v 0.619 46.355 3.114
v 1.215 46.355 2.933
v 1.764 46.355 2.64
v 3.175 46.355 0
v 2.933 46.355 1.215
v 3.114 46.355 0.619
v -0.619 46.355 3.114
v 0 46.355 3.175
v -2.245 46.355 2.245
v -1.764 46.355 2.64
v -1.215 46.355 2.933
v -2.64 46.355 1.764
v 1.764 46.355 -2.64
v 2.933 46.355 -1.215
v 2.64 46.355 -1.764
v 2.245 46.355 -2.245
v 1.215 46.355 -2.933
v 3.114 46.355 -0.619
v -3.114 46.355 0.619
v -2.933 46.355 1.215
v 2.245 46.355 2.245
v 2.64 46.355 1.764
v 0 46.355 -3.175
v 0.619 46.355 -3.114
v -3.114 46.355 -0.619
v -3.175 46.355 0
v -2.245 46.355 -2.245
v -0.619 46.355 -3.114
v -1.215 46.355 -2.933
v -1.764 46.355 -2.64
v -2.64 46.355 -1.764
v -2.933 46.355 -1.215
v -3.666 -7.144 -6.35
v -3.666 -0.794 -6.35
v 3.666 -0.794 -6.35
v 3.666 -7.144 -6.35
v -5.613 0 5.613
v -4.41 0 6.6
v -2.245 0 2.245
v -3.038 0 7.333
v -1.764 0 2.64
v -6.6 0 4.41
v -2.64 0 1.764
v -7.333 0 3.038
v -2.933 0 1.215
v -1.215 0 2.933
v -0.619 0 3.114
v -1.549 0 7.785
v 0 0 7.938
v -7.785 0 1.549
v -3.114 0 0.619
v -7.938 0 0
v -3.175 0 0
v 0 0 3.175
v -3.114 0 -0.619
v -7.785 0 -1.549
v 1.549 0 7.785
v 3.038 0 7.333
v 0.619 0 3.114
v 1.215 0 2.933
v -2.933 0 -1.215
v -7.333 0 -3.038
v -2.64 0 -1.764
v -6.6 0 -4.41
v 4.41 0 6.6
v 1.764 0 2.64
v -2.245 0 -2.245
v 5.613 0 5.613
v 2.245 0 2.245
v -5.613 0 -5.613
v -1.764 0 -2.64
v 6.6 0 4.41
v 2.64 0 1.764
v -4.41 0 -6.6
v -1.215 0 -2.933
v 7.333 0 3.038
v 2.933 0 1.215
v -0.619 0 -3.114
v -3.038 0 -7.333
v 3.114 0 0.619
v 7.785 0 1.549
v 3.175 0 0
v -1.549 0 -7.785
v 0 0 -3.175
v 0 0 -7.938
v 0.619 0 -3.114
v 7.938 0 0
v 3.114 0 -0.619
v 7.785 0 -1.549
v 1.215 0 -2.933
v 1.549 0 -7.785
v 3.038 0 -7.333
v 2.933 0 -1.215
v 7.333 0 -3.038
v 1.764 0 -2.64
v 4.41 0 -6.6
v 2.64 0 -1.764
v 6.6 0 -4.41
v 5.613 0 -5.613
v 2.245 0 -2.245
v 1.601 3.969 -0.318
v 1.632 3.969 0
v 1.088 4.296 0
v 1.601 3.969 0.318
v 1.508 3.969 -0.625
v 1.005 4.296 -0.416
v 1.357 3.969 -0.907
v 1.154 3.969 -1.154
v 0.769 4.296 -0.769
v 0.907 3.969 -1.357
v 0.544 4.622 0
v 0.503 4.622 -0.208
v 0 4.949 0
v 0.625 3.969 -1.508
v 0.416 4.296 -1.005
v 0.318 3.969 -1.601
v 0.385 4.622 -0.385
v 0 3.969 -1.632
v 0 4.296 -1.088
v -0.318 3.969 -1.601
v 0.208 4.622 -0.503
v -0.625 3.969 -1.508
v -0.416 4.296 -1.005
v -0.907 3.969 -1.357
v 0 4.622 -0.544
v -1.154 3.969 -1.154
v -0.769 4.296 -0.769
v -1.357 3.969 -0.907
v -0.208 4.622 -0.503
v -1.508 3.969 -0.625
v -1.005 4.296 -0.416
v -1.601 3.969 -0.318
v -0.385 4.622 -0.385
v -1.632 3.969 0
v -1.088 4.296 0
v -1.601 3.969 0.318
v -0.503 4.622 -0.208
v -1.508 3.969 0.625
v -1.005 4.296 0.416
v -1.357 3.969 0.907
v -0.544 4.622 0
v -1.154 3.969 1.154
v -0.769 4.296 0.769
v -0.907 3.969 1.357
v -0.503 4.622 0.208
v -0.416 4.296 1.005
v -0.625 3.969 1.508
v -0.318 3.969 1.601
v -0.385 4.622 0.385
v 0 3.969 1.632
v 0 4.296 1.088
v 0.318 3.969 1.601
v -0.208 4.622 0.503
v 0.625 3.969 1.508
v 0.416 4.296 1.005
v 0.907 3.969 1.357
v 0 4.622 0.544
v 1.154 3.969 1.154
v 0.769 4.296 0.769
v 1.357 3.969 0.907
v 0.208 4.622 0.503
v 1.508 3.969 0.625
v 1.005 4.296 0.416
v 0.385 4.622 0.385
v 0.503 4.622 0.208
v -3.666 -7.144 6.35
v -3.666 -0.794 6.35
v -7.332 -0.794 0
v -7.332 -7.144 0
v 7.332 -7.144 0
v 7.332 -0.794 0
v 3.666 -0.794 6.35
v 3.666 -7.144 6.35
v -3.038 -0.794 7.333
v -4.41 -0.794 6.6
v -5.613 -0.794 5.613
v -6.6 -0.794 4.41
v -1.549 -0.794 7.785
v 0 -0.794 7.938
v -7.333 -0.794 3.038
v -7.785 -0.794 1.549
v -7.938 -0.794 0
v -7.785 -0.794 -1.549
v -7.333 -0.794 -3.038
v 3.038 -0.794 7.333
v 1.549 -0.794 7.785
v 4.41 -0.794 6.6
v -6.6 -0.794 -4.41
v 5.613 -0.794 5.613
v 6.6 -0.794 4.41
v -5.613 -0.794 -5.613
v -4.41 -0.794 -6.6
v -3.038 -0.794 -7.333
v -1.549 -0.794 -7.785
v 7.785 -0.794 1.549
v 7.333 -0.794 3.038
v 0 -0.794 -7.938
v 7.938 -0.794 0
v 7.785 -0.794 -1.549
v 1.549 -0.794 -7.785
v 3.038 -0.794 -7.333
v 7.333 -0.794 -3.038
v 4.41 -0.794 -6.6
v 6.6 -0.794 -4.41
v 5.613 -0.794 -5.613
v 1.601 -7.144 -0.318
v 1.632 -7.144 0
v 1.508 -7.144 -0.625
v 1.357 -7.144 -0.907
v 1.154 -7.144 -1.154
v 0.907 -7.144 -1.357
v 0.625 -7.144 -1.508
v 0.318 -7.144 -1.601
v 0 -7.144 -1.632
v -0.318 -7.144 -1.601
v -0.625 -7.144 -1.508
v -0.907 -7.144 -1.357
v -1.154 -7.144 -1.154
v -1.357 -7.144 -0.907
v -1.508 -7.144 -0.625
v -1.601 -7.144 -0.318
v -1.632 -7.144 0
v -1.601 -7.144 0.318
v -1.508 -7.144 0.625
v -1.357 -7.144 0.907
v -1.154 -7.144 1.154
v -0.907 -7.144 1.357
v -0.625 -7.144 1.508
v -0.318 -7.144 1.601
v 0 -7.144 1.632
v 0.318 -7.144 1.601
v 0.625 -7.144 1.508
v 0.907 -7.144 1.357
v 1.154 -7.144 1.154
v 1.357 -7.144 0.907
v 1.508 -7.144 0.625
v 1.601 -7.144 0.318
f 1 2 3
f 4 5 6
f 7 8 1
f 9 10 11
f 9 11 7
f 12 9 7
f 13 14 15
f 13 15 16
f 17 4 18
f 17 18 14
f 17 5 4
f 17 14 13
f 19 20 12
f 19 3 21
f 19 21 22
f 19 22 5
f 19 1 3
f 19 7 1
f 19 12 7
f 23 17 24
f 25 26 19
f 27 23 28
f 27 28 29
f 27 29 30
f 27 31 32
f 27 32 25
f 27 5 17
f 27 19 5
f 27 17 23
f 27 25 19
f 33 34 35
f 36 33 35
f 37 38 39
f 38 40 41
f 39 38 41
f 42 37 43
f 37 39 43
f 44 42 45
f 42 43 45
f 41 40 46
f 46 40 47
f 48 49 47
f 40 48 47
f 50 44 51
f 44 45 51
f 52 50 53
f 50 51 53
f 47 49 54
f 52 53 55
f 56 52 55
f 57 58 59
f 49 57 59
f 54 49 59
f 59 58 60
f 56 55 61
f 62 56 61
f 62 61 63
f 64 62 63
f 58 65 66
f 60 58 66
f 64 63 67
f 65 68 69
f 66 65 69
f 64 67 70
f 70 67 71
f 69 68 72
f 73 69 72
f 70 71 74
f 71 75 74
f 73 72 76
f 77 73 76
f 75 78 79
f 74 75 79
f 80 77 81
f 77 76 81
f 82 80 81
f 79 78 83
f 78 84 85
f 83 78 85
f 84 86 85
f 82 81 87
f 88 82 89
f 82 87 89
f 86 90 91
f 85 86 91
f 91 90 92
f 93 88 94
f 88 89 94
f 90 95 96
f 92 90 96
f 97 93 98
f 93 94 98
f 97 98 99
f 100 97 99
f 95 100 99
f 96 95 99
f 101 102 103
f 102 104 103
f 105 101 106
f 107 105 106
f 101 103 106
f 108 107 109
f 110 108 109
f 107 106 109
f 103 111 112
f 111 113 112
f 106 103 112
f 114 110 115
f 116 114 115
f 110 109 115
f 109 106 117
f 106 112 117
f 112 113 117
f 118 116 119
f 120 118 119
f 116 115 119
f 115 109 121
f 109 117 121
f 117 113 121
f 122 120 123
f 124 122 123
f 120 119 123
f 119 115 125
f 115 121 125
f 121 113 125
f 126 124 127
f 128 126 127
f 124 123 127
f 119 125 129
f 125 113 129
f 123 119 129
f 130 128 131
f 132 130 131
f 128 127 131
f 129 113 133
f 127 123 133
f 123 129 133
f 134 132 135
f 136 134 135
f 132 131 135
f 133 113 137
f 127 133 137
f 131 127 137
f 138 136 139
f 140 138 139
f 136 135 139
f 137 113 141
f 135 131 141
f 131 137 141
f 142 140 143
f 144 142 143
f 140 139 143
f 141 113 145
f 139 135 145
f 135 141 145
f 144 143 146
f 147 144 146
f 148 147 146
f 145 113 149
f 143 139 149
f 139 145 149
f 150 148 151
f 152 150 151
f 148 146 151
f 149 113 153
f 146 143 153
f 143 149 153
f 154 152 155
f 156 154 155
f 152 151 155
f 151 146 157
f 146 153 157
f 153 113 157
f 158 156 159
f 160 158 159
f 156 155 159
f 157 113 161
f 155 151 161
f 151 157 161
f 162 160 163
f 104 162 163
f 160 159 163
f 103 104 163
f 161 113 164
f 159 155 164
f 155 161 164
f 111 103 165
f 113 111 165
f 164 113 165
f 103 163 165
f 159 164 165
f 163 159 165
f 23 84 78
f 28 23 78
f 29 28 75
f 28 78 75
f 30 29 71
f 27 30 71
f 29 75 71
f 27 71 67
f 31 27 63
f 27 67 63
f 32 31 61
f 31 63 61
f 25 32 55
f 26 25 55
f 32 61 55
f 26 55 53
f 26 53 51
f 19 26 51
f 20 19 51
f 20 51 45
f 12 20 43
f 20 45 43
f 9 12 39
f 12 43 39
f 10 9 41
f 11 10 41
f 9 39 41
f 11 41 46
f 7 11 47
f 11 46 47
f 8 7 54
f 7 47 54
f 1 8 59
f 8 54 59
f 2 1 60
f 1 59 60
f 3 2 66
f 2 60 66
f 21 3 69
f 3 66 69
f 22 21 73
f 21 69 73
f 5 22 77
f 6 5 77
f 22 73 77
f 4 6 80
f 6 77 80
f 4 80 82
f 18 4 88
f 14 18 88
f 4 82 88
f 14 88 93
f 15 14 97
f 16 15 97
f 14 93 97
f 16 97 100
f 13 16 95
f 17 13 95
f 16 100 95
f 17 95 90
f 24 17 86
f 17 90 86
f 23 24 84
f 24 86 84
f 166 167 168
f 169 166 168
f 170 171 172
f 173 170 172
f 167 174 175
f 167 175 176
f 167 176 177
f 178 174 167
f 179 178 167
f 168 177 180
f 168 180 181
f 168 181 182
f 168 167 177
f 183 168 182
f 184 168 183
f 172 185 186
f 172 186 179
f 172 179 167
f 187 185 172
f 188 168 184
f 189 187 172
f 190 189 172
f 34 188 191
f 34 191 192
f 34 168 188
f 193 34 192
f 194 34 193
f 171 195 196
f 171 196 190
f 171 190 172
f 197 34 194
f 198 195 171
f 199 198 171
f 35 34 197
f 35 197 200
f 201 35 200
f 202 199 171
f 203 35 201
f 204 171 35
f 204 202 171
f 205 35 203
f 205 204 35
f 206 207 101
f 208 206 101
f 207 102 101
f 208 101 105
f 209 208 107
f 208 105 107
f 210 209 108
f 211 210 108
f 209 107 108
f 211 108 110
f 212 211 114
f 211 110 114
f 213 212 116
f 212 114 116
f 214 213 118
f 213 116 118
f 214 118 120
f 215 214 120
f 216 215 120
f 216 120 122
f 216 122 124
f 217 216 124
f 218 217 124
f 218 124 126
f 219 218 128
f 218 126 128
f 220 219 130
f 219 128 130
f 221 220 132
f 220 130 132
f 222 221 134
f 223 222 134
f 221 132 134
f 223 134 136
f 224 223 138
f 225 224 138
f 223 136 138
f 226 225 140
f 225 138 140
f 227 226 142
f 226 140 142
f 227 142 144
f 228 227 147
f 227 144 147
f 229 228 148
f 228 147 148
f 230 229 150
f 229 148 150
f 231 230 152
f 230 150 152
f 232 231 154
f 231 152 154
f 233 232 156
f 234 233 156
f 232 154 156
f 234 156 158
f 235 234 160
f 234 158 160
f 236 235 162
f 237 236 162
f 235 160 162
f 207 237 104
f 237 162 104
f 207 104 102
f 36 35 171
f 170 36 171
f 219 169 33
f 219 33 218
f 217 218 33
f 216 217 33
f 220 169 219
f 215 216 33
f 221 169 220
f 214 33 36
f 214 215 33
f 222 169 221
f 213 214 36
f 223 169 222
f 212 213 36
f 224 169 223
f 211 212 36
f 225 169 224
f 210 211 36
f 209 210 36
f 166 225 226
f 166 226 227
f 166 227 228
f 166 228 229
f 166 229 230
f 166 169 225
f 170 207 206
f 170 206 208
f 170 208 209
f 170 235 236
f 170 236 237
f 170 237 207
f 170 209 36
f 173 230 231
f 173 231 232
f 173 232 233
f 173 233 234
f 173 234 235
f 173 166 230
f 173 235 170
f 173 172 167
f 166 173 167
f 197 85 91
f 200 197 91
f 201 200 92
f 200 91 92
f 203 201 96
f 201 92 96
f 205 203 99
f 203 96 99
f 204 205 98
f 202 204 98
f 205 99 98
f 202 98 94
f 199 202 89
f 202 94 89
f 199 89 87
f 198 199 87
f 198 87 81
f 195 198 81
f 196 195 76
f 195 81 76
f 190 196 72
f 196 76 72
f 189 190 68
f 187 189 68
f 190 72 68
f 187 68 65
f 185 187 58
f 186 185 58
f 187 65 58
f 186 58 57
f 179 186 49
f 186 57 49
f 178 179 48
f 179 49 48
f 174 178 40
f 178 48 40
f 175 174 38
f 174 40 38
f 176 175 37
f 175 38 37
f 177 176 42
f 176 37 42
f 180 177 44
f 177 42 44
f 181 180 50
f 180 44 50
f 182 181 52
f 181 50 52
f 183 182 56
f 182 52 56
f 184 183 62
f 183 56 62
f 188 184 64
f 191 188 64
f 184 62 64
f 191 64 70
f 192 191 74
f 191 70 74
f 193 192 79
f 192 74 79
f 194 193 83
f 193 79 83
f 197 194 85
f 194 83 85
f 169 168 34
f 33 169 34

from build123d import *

# Parameters (mm, degrees)
SKETCH1_R           = 3.175
BOSS_EXTRUDE1_DEPTH = 46.355
SKETCH3_R           = 7.9375
BOSS_EXTRUDE3_DEPTH = 0.79375
BOSS_EXTRUDE4_DEPTH = 6.35


# Read off the part's stored shape, not the designer's step: AdvancedHole1
with BuildPart() as part:
    # Sketch1 → Boss-Extrude1 (new body)
    with BuildSketch(Plane(origin=(0, 0, 0), x_dir=(1, 0, 0), z_dir=(0, 1, 0))):
        with Locations(Location((0, 0, 0), (0, 0, 90))):
            Circle(SKETCH1_R)
    extrude(amount=BOSS_EXTRUDE1_DEPTH)

    # Sketch3 → Boss-Extrude3 (add)
    with BuildSketch(Plane.XZ):
        with Locations(Location((0, 0, 0), (0, 0, 270))):
            Circle(SKETCH3_R)
    extrude(amount=BOSS_EXTRUDE3_DEPTH)

    # Sketch4 → Boss-Extrude4 (add)
    with BuildSketch(Plane.XZ.offset(0.79375)):
        Polygon((3.666174209, 6.35), (-3.666174209, 6.35), (-7.332348419, 0), (-3.666174209, -6.35), (3.666174209, -6.35), (7.332348419, 0), align=None)
    extrude(amount=BOSS_EXTRUDE4_DEPTH)

    # AdvancedHole1 outline → AdvancedHole1 (revolve, cut)
    with BuildSketch(Plane.XY):
        Polygon((1.63195, -7.14375), (1.63195, 3.96875), (0, 4.949324487), (0, -7.14375), align=None)
    revolve(axis=Axis((0, 0, 0), (0, 1, 0)), mode=Mode.SUBTRACT)


solid = part.part
